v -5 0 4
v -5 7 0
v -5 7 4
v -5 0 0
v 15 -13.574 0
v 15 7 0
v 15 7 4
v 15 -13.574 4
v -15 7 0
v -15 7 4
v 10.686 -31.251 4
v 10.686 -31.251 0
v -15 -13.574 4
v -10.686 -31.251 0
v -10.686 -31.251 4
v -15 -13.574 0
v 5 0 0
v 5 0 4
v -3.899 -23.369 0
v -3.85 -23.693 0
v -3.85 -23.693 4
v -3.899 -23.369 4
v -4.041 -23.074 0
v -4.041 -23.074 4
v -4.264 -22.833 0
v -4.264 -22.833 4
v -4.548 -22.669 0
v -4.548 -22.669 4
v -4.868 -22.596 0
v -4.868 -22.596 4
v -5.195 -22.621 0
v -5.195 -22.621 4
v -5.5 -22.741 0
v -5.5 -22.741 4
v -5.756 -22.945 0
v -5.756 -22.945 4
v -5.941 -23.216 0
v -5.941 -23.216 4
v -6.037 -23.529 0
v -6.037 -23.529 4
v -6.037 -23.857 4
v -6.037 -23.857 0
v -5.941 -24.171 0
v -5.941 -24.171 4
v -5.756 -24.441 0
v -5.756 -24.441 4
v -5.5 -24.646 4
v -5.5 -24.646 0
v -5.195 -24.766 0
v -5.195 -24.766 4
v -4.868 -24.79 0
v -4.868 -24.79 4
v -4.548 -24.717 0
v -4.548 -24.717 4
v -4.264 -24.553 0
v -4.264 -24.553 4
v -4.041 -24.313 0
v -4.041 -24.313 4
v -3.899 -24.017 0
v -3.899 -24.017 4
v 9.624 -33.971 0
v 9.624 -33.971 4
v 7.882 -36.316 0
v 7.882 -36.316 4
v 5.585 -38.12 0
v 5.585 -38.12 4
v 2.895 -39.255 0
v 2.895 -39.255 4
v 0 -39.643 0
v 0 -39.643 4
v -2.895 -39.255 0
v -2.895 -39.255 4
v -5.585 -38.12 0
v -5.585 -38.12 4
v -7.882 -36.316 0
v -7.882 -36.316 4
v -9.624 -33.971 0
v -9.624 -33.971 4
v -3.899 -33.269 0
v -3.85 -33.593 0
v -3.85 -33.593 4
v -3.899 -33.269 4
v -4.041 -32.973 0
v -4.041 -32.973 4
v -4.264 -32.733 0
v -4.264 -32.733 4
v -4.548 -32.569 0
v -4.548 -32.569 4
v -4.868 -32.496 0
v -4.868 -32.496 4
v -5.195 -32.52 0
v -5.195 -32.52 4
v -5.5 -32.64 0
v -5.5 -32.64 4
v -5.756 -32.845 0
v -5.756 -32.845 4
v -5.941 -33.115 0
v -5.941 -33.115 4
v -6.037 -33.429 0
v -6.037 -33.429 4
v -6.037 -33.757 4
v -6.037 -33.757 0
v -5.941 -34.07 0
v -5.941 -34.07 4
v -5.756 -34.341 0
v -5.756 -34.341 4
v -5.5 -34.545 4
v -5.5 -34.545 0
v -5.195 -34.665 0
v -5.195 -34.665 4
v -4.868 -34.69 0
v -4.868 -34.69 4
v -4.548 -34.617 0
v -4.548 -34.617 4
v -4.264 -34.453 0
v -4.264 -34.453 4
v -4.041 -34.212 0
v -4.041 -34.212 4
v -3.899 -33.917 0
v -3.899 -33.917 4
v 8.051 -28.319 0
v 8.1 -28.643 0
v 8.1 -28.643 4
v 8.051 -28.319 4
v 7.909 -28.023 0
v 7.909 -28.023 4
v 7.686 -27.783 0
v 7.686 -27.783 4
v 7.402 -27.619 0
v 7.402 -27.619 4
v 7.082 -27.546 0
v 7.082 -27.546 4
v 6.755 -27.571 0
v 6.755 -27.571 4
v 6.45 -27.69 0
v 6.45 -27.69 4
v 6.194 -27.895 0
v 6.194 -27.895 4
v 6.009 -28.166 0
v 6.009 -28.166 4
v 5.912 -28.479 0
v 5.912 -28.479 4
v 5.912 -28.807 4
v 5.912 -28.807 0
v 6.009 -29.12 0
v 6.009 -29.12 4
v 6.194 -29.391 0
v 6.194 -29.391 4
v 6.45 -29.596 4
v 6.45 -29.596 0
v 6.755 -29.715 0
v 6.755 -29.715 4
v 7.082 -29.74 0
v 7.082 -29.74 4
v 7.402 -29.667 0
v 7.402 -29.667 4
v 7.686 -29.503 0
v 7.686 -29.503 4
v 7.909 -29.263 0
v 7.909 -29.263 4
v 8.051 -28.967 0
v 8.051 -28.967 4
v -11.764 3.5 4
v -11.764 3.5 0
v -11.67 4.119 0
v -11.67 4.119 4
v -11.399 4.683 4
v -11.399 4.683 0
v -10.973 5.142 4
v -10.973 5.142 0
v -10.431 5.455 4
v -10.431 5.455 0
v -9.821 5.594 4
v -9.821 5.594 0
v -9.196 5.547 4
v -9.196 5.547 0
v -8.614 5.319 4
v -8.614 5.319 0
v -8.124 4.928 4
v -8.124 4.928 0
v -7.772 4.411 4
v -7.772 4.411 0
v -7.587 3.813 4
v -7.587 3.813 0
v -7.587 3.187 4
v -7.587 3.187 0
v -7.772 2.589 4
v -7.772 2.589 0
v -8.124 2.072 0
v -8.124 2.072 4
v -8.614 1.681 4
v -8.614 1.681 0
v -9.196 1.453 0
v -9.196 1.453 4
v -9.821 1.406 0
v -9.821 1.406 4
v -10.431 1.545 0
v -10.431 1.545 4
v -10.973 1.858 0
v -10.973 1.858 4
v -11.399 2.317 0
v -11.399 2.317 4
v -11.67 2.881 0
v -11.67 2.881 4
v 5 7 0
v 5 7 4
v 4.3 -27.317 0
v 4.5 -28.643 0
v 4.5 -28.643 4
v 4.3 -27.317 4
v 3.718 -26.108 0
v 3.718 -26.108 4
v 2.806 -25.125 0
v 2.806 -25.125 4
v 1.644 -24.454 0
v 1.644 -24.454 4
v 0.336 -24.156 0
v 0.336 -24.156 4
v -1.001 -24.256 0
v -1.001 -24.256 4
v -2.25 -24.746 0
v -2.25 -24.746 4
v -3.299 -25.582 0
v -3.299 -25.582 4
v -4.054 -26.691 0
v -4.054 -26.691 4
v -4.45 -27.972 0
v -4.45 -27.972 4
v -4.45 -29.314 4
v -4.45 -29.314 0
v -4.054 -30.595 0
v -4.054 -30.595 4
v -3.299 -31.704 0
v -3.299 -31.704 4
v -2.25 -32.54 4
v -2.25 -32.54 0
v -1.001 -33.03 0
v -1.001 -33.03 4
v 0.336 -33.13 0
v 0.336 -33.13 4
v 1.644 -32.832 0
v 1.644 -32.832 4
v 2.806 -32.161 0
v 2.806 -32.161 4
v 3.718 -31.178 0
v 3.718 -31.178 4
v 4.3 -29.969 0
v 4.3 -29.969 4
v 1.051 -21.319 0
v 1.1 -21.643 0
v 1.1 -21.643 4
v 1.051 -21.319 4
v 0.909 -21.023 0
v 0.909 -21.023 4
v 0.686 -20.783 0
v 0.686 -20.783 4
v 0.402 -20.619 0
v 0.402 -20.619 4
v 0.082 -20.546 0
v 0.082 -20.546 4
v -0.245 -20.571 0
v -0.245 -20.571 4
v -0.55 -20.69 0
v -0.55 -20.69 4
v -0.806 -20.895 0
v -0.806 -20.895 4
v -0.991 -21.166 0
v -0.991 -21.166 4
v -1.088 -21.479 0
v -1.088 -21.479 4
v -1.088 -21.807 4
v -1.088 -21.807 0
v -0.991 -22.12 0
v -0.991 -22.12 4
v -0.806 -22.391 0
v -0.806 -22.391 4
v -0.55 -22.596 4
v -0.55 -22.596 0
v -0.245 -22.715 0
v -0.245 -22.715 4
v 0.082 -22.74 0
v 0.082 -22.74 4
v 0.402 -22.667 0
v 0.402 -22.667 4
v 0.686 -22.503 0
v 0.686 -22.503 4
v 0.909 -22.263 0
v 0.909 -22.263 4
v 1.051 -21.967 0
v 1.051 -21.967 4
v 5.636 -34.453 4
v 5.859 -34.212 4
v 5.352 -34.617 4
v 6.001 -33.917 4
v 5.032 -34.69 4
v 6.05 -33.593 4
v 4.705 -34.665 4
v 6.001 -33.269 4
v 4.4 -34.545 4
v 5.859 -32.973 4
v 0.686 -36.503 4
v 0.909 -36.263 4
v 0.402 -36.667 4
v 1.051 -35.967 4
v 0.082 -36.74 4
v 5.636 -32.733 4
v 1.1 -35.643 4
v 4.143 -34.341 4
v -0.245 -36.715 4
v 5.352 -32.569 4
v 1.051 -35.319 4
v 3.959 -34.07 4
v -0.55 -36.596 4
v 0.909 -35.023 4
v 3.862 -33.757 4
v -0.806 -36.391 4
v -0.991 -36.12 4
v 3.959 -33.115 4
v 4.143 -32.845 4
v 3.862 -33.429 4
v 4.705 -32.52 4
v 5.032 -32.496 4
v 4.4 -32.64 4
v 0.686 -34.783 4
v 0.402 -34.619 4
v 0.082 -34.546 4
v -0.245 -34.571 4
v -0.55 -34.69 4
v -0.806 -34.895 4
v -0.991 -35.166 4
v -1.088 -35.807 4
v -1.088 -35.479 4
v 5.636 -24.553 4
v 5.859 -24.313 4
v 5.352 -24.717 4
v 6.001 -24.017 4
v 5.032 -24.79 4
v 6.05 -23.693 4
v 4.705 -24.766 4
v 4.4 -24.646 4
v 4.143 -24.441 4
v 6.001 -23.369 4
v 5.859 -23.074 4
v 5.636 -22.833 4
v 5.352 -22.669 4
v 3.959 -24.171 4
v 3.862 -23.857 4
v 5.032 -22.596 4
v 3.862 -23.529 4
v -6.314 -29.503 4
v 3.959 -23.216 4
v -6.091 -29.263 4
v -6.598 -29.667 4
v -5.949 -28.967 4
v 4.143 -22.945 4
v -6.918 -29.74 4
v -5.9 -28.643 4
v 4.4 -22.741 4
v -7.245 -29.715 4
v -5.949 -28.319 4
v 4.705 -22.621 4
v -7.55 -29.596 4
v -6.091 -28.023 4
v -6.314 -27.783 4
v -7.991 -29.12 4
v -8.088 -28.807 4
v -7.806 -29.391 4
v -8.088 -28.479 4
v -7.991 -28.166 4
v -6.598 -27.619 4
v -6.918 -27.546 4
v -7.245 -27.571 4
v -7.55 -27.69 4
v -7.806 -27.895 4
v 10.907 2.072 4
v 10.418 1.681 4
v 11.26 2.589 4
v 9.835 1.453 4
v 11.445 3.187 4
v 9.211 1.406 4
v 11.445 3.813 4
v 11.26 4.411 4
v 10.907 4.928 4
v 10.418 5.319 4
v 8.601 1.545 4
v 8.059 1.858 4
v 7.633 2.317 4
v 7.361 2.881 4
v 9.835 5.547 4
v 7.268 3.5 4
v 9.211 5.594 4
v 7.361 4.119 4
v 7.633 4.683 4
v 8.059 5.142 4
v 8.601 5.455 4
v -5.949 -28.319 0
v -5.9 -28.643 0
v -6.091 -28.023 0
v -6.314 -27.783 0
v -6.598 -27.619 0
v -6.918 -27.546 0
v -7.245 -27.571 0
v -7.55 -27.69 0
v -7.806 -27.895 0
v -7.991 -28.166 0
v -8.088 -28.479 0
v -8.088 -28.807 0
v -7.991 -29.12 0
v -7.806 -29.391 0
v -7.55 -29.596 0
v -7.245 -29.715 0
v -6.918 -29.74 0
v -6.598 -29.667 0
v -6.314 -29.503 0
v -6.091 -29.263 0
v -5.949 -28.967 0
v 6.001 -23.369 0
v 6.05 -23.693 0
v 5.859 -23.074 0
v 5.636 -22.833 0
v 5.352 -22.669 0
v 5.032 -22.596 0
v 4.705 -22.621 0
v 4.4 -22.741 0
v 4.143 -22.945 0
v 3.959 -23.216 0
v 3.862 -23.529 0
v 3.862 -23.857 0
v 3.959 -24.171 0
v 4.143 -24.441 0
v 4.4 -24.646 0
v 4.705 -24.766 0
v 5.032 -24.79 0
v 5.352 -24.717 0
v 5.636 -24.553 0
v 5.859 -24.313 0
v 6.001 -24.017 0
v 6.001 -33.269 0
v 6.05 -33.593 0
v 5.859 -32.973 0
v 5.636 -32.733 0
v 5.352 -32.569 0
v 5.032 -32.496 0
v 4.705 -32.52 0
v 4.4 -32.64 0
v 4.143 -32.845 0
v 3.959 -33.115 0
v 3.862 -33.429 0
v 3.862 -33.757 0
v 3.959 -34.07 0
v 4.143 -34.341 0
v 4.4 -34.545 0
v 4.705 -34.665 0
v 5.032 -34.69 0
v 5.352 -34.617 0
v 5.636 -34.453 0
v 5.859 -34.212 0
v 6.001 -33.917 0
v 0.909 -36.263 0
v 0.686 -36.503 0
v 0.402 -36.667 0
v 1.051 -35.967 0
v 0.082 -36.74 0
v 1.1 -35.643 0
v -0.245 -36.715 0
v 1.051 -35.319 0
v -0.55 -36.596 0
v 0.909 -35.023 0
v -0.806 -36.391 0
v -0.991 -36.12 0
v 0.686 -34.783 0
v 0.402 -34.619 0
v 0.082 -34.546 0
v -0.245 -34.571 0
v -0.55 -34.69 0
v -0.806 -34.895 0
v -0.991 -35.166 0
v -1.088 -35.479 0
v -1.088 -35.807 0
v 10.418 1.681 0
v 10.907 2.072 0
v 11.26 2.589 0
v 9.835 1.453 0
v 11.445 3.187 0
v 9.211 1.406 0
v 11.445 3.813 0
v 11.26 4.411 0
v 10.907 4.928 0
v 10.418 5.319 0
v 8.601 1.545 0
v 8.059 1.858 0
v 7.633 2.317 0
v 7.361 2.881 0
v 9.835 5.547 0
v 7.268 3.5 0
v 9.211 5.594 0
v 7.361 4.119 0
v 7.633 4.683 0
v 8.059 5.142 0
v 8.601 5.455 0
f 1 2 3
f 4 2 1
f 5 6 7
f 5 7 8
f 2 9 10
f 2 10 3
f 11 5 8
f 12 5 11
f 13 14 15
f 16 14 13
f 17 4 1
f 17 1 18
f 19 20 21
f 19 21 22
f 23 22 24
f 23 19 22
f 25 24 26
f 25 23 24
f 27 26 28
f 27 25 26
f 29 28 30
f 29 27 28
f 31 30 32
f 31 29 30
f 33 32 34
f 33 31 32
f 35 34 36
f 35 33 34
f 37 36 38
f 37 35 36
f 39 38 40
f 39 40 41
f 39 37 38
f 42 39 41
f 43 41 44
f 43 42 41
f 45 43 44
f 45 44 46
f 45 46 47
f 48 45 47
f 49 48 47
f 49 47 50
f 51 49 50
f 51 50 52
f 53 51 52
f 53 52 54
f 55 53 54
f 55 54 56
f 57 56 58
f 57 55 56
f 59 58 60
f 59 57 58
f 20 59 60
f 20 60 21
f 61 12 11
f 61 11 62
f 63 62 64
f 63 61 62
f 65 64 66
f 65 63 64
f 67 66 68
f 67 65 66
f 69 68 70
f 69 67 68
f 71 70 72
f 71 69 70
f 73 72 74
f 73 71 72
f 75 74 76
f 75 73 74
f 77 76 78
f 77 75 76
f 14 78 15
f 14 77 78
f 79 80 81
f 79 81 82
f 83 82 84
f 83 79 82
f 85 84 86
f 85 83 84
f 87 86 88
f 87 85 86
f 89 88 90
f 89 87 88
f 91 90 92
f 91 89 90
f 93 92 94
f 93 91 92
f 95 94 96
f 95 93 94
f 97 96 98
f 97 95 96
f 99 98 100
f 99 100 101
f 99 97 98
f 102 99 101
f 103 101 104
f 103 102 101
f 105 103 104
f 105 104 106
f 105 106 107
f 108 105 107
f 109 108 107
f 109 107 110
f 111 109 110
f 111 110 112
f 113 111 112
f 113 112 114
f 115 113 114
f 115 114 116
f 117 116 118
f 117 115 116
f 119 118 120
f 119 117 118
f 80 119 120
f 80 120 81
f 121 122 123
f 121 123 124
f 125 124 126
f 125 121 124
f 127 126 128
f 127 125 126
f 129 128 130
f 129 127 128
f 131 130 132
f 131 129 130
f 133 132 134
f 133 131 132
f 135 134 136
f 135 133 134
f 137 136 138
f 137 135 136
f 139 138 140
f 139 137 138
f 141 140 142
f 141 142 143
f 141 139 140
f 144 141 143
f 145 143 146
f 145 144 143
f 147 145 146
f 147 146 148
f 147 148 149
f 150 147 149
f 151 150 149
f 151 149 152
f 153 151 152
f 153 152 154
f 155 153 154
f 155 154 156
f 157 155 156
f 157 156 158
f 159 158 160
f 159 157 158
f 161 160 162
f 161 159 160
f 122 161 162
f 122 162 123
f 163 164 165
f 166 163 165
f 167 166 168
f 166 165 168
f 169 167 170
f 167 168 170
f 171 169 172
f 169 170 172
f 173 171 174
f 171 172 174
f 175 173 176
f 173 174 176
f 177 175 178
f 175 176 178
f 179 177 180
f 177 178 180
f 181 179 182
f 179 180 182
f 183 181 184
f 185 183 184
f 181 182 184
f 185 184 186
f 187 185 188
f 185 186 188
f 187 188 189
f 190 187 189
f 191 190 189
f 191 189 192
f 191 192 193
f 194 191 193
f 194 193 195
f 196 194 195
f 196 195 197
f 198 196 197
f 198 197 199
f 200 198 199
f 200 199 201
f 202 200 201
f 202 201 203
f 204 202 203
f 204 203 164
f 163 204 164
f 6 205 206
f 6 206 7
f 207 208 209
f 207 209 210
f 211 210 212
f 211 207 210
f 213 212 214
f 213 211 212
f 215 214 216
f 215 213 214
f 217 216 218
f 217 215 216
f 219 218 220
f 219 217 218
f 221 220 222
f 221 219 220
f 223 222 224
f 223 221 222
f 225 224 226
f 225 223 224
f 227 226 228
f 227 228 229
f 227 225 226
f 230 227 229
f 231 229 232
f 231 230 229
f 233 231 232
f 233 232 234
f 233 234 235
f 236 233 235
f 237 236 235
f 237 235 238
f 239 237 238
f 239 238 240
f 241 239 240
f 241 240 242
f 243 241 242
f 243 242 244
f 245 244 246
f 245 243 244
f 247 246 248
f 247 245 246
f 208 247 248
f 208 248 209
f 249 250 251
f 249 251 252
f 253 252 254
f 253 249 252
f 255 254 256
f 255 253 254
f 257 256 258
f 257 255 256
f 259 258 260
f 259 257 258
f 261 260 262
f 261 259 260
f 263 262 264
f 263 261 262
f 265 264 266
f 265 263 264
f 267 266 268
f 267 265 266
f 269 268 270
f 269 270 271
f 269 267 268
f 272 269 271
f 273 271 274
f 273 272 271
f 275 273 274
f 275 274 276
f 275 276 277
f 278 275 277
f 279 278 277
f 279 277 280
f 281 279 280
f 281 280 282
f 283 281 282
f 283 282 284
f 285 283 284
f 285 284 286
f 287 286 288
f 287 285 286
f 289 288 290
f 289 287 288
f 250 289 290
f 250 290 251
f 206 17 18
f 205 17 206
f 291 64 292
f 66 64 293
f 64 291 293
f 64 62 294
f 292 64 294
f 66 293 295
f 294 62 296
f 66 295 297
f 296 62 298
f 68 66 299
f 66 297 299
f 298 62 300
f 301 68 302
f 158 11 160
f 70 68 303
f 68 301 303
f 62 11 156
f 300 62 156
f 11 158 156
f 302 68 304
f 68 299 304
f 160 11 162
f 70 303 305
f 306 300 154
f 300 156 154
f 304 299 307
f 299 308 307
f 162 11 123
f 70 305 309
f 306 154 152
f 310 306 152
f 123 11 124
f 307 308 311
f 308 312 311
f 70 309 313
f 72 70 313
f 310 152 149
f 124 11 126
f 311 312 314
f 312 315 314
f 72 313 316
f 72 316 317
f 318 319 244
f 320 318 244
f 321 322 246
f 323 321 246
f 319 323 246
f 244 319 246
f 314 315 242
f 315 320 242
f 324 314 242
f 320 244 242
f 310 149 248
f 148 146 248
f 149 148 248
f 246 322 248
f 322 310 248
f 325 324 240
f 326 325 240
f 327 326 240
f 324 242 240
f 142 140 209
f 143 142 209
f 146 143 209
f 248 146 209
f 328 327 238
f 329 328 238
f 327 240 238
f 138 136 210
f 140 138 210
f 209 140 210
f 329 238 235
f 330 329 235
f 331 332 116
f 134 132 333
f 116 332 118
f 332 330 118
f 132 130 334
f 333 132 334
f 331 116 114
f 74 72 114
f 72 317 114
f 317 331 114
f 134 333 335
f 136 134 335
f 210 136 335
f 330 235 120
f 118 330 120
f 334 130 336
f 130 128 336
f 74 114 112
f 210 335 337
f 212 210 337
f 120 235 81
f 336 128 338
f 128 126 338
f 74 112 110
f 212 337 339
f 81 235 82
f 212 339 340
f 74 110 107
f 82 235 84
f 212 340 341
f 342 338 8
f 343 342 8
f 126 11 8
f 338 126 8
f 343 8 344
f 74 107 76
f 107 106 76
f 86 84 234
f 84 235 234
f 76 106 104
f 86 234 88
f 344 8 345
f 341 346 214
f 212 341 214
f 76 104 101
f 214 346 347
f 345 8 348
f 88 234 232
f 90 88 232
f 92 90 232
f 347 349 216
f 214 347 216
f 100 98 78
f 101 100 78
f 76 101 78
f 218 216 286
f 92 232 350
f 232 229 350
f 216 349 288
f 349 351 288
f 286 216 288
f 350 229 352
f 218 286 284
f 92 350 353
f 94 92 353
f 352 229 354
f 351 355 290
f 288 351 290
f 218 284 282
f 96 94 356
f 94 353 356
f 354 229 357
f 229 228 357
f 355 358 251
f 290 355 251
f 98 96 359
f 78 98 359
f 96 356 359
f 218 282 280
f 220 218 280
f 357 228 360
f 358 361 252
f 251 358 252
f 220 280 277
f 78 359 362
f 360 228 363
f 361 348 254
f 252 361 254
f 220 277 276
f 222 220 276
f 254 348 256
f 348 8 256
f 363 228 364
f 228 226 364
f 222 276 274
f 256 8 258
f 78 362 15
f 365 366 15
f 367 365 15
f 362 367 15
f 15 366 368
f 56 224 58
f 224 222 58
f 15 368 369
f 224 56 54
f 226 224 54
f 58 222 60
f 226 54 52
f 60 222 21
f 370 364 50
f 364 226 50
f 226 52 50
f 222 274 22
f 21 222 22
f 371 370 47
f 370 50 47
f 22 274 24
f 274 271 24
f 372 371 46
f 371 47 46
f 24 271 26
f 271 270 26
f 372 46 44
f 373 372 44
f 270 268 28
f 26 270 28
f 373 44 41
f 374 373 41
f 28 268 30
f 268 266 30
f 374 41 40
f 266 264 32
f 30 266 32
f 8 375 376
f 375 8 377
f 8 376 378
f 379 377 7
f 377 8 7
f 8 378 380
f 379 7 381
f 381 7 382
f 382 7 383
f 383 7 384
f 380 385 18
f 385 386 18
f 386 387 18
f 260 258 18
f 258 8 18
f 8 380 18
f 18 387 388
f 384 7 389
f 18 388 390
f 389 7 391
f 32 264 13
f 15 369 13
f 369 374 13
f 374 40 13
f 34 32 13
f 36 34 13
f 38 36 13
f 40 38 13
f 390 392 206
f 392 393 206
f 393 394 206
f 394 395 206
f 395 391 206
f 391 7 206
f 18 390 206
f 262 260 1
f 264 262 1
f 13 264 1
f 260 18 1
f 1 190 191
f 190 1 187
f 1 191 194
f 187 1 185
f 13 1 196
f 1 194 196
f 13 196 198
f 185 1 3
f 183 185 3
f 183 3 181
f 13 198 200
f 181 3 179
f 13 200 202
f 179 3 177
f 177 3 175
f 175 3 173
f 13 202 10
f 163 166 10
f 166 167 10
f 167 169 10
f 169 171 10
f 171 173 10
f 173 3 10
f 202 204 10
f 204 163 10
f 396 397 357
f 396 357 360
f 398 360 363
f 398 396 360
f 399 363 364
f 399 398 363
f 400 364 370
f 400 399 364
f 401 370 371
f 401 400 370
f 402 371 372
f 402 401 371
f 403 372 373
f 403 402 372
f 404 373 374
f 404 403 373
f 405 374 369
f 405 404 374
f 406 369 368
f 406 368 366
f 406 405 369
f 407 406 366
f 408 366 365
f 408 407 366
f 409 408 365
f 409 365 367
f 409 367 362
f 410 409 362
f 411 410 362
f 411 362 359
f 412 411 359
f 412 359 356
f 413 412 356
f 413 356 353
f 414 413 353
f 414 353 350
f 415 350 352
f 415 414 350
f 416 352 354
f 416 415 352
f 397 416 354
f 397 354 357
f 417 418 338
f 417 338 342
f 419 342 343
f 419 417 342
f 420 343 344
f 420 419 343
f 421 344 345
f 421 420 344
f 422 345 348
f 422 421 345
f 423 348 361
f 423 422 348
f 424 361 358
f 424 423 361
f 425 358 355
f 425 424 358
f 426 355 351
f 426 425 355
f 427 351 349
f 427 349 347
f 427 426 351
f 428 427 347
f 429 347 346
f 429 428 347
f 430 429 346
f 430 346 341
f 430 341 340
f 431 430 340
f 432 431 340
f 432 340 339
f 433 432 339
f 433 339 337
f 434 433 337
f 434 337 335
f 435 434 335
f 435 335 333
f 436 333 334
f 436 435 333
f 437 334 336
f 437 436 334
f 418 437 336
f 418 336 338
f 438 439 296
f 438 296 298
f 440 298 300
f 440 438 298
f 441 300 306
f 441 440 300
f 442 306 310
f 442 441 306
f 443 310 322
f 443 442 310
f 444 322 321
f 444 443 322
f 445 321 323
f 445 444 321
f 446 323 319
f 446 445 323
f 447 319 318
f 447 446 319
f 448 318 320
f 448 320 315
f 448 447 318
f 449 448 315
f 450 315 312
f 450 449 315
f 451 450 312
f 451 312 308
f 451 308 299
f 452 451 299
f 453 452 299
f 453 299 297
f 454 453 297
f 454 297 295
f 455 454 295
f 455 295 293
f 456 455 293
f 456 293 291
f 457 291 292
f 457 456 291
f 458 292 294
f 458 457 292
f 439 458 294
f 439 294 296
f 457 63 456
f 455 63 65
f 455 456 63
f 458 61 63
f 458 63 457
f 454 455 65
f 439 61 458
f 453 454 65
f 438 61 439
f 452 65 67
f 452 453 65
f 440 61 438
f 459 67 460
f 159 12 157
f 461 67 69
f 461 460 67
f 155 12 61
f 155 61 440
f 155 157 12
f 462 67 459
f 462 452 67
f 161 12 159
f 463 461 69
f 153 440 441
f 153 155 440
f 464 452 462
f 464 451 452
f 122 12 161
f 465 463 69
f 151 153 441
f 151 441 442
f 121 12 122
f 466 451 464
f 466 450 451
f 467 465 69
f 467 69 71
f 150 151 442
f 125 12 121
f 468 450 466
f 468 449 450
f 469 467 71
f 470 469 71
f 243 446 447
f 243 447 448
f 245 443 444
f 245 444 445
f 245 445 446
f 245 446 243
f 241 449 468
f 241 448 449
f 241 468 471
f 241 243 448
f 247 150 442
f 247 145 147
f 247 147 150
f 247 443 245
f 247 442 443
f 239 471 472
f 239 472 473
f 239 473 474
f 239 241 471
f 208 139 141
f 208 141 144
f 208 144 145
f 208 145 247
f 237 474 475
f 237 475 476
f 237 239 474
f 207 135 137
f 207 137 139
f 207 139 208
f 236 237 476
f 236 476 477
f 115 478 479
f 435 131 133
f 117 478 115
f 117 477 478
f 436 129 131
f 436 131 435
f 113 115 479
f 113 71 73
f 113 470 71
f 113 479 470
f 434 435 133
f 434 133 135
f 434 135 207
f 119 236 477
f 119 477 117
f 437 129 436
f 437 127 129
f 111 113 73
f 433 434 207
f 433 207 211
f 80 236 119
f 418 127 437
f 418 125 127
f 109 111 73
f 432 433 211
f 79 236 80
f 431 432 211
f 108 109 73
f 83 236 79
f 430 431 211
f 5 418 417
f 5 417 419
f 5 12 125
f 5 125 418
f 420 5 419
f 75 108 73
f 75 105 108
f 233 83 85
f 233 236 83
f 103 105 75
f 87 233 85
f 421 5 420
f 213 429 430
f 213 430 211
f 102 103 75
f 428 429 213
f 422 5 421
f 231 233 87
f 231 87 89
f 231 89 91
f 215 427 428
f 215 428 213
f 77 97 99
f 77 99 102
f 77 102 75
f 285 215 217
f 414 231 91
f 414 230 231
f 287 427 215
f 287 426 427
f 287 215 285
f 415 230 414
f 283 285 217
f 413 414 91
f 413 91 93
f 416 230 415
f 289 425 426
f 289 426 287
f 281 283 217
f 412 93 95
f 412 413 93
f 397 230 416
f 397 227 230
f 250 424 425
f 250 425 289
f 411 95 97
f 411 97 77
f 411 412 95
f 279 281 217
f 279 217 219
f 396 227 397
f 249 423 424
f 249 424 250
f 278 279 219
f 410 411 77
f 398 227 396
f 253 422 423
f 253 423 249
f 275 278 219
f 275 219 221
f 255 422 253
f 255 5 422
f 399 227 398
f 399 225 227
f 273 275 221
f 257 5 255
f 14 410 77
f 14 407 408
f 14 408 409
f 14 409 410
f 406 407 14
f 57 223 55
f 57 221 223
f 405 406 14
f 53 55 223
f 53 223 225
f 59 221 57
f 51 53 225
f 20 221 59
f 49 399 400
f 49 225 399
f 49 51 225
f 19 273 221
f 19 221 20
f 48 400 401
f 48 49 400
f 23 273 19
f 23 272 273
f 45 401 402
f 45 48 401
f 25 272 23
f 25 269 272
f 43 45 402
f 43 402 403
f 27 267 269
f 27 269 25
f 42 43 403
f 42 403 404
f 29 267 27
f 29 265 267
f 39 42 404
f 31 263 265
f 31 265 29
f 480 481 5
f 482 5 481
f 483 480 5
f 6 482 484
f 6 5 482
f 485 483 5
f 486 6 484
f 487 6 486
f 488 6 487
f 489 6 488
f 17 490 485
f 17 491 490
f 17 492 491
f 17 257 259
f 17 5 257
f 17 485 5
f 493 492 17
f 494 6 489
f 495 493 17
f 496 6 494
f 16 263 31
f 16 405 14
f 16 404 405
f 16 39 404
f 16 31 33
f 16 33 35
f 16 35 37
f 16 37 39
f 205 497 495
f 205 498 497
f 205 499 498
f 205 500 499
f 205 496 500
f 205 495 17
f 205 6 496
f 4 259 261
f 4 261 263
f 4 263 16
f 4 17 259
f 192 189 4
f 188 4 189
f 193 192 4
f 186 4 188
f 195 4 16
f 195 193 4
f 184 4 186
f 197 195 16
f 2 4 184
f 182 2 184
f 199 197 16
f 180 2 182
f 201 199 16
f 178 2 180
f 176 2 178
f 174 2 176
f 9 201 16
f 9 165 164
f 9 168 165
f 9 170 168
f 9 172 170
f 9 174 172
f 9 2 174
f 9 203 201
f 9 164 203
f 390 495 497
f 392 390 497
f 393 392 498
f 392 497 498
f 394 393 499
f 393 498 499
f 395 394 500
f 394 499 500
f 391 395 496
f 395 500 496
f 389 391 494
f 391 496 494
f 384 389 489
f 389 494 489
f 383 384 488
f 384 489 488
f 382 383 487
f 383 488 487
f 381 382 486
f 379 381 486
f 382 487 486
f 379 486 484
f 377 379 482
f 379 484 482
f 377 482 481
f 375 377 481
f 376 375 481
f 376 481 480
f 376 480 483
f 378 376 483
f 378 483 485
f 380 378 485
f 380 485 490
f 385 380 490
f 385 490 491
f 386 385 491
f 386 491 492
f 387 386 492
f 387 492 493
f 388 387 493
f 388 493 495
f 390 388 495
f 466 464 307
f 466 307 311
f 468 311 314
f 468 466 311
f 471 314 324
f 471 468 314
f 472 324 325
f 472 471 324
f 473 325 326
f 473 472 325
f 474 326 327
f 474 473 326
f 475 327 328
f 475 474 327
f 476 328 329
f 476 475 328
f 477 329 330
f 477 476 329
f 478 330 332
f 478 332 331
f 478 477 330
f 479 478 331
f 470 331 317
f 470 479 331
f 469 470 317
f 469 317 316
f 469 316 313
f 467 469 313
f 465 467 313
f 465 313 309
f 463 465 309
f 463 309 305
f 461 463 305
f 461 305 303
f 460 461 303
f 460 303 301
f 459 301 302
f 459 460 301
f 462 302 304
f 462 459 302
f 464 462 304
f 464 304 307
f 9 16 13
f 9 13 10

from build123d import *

# Parameters (mm, degrees)
ESQUISSE1_R        = 4.5
ESQUISSE1_R_2      = 1.1
BOSS_EXTRU_1_DEPTH = 4
SKETCH1_R          = 2.1
CUT_EXTRUDE1_DEPTH = 43.574273021


with BuildPart() as part:
    # Esquisse1 → Boss.-Extru.1 (new body)
    with BuildSketch(Plane.XY):
        with BuildLine():
            Line((-15, 3), (-15, 7))
            Line((-15, 7), (-5, 7))
            Line((-5, 7), (-5, 0))
            Line((-5, 0), (5, 0))
            Line((5, 0), (5, 7))
            Line((5, 7), (15, 7))
            Line((15, 7), (15, 3))
            Line((15, 3), (15, -13.574063778))
            Line((15, -13.574063778), (10.686419419, -31.250781398))
            ThreePointArc((10.686419419, -31.250781398), (0, -39.643016072), (-10.686419419, -31.250781398))
            Line((-10.686419419, -31.250781398), (-15, -13.574063778))
            Line((-15, -13.574063778), (-15, 3))
        make_face()
        with Locations((0, -28.643016072)):
            Circle(ESQUISSE1_R, mode=Mode.SUBTRACT)
        with Locations((0, -21.643016072)):
            Circle(ESQUISSE1_R_2, mode=Mode.SUBTRACT)
        with Locations((4.949747468, -23.693268604)):
            Circle(ESQUISSE1_R_2, mode=Mode.SUBTRACT)
        with Locations((7, -28.643016072)):
            Circle(ESQUISSE1_R_2, mode=Mode.SUBTRACT)
        with Locations((4.949747468, -33.59276354)):
            Circle(ESQUISSE1_R_2, mode=Mode.SUBTRACT)
        with Locations((0, -35.643016072)):
            Circle(ESQUISSE1_R_2, mode=Mode.SUBTRACT)
        with Locations((-4.949747468, -33.59276354)):
            Circle(ESQUISSE1_R_2, mode=Mode.SUBTRACT)
        with Locations((-7, -28.643016072)):
            Circle(ESQUISSE1_R_2, mode=Mode.SUBTRACT)
        with Locations((-4.949747468, -23.693268604)):
            Circle(ESQUISSE1_R_2, mode=Mode.SUBTRACT)
    extrude(amount=BOSS_EXTRU_1_DEPTH)

    # Sketch1 → Cut-Extrude1 (cut, through all)
    with BuildSketch(Plane(origin=(0, 0, 0), x_dir=(-1, 0, 0), z_dir=(0, 0, -1))):
        with Locations((-9.368015407, 3.5)):
            Circle(SKETCH1_R)
        with Locations((9.663609861, 3.5)):
            Circle(SKETCH1_R)
    extrude(amount=-CUT_EXTRUDE1_DEPTH, mode=Mode.SUBTRACT)


solid = part.part
